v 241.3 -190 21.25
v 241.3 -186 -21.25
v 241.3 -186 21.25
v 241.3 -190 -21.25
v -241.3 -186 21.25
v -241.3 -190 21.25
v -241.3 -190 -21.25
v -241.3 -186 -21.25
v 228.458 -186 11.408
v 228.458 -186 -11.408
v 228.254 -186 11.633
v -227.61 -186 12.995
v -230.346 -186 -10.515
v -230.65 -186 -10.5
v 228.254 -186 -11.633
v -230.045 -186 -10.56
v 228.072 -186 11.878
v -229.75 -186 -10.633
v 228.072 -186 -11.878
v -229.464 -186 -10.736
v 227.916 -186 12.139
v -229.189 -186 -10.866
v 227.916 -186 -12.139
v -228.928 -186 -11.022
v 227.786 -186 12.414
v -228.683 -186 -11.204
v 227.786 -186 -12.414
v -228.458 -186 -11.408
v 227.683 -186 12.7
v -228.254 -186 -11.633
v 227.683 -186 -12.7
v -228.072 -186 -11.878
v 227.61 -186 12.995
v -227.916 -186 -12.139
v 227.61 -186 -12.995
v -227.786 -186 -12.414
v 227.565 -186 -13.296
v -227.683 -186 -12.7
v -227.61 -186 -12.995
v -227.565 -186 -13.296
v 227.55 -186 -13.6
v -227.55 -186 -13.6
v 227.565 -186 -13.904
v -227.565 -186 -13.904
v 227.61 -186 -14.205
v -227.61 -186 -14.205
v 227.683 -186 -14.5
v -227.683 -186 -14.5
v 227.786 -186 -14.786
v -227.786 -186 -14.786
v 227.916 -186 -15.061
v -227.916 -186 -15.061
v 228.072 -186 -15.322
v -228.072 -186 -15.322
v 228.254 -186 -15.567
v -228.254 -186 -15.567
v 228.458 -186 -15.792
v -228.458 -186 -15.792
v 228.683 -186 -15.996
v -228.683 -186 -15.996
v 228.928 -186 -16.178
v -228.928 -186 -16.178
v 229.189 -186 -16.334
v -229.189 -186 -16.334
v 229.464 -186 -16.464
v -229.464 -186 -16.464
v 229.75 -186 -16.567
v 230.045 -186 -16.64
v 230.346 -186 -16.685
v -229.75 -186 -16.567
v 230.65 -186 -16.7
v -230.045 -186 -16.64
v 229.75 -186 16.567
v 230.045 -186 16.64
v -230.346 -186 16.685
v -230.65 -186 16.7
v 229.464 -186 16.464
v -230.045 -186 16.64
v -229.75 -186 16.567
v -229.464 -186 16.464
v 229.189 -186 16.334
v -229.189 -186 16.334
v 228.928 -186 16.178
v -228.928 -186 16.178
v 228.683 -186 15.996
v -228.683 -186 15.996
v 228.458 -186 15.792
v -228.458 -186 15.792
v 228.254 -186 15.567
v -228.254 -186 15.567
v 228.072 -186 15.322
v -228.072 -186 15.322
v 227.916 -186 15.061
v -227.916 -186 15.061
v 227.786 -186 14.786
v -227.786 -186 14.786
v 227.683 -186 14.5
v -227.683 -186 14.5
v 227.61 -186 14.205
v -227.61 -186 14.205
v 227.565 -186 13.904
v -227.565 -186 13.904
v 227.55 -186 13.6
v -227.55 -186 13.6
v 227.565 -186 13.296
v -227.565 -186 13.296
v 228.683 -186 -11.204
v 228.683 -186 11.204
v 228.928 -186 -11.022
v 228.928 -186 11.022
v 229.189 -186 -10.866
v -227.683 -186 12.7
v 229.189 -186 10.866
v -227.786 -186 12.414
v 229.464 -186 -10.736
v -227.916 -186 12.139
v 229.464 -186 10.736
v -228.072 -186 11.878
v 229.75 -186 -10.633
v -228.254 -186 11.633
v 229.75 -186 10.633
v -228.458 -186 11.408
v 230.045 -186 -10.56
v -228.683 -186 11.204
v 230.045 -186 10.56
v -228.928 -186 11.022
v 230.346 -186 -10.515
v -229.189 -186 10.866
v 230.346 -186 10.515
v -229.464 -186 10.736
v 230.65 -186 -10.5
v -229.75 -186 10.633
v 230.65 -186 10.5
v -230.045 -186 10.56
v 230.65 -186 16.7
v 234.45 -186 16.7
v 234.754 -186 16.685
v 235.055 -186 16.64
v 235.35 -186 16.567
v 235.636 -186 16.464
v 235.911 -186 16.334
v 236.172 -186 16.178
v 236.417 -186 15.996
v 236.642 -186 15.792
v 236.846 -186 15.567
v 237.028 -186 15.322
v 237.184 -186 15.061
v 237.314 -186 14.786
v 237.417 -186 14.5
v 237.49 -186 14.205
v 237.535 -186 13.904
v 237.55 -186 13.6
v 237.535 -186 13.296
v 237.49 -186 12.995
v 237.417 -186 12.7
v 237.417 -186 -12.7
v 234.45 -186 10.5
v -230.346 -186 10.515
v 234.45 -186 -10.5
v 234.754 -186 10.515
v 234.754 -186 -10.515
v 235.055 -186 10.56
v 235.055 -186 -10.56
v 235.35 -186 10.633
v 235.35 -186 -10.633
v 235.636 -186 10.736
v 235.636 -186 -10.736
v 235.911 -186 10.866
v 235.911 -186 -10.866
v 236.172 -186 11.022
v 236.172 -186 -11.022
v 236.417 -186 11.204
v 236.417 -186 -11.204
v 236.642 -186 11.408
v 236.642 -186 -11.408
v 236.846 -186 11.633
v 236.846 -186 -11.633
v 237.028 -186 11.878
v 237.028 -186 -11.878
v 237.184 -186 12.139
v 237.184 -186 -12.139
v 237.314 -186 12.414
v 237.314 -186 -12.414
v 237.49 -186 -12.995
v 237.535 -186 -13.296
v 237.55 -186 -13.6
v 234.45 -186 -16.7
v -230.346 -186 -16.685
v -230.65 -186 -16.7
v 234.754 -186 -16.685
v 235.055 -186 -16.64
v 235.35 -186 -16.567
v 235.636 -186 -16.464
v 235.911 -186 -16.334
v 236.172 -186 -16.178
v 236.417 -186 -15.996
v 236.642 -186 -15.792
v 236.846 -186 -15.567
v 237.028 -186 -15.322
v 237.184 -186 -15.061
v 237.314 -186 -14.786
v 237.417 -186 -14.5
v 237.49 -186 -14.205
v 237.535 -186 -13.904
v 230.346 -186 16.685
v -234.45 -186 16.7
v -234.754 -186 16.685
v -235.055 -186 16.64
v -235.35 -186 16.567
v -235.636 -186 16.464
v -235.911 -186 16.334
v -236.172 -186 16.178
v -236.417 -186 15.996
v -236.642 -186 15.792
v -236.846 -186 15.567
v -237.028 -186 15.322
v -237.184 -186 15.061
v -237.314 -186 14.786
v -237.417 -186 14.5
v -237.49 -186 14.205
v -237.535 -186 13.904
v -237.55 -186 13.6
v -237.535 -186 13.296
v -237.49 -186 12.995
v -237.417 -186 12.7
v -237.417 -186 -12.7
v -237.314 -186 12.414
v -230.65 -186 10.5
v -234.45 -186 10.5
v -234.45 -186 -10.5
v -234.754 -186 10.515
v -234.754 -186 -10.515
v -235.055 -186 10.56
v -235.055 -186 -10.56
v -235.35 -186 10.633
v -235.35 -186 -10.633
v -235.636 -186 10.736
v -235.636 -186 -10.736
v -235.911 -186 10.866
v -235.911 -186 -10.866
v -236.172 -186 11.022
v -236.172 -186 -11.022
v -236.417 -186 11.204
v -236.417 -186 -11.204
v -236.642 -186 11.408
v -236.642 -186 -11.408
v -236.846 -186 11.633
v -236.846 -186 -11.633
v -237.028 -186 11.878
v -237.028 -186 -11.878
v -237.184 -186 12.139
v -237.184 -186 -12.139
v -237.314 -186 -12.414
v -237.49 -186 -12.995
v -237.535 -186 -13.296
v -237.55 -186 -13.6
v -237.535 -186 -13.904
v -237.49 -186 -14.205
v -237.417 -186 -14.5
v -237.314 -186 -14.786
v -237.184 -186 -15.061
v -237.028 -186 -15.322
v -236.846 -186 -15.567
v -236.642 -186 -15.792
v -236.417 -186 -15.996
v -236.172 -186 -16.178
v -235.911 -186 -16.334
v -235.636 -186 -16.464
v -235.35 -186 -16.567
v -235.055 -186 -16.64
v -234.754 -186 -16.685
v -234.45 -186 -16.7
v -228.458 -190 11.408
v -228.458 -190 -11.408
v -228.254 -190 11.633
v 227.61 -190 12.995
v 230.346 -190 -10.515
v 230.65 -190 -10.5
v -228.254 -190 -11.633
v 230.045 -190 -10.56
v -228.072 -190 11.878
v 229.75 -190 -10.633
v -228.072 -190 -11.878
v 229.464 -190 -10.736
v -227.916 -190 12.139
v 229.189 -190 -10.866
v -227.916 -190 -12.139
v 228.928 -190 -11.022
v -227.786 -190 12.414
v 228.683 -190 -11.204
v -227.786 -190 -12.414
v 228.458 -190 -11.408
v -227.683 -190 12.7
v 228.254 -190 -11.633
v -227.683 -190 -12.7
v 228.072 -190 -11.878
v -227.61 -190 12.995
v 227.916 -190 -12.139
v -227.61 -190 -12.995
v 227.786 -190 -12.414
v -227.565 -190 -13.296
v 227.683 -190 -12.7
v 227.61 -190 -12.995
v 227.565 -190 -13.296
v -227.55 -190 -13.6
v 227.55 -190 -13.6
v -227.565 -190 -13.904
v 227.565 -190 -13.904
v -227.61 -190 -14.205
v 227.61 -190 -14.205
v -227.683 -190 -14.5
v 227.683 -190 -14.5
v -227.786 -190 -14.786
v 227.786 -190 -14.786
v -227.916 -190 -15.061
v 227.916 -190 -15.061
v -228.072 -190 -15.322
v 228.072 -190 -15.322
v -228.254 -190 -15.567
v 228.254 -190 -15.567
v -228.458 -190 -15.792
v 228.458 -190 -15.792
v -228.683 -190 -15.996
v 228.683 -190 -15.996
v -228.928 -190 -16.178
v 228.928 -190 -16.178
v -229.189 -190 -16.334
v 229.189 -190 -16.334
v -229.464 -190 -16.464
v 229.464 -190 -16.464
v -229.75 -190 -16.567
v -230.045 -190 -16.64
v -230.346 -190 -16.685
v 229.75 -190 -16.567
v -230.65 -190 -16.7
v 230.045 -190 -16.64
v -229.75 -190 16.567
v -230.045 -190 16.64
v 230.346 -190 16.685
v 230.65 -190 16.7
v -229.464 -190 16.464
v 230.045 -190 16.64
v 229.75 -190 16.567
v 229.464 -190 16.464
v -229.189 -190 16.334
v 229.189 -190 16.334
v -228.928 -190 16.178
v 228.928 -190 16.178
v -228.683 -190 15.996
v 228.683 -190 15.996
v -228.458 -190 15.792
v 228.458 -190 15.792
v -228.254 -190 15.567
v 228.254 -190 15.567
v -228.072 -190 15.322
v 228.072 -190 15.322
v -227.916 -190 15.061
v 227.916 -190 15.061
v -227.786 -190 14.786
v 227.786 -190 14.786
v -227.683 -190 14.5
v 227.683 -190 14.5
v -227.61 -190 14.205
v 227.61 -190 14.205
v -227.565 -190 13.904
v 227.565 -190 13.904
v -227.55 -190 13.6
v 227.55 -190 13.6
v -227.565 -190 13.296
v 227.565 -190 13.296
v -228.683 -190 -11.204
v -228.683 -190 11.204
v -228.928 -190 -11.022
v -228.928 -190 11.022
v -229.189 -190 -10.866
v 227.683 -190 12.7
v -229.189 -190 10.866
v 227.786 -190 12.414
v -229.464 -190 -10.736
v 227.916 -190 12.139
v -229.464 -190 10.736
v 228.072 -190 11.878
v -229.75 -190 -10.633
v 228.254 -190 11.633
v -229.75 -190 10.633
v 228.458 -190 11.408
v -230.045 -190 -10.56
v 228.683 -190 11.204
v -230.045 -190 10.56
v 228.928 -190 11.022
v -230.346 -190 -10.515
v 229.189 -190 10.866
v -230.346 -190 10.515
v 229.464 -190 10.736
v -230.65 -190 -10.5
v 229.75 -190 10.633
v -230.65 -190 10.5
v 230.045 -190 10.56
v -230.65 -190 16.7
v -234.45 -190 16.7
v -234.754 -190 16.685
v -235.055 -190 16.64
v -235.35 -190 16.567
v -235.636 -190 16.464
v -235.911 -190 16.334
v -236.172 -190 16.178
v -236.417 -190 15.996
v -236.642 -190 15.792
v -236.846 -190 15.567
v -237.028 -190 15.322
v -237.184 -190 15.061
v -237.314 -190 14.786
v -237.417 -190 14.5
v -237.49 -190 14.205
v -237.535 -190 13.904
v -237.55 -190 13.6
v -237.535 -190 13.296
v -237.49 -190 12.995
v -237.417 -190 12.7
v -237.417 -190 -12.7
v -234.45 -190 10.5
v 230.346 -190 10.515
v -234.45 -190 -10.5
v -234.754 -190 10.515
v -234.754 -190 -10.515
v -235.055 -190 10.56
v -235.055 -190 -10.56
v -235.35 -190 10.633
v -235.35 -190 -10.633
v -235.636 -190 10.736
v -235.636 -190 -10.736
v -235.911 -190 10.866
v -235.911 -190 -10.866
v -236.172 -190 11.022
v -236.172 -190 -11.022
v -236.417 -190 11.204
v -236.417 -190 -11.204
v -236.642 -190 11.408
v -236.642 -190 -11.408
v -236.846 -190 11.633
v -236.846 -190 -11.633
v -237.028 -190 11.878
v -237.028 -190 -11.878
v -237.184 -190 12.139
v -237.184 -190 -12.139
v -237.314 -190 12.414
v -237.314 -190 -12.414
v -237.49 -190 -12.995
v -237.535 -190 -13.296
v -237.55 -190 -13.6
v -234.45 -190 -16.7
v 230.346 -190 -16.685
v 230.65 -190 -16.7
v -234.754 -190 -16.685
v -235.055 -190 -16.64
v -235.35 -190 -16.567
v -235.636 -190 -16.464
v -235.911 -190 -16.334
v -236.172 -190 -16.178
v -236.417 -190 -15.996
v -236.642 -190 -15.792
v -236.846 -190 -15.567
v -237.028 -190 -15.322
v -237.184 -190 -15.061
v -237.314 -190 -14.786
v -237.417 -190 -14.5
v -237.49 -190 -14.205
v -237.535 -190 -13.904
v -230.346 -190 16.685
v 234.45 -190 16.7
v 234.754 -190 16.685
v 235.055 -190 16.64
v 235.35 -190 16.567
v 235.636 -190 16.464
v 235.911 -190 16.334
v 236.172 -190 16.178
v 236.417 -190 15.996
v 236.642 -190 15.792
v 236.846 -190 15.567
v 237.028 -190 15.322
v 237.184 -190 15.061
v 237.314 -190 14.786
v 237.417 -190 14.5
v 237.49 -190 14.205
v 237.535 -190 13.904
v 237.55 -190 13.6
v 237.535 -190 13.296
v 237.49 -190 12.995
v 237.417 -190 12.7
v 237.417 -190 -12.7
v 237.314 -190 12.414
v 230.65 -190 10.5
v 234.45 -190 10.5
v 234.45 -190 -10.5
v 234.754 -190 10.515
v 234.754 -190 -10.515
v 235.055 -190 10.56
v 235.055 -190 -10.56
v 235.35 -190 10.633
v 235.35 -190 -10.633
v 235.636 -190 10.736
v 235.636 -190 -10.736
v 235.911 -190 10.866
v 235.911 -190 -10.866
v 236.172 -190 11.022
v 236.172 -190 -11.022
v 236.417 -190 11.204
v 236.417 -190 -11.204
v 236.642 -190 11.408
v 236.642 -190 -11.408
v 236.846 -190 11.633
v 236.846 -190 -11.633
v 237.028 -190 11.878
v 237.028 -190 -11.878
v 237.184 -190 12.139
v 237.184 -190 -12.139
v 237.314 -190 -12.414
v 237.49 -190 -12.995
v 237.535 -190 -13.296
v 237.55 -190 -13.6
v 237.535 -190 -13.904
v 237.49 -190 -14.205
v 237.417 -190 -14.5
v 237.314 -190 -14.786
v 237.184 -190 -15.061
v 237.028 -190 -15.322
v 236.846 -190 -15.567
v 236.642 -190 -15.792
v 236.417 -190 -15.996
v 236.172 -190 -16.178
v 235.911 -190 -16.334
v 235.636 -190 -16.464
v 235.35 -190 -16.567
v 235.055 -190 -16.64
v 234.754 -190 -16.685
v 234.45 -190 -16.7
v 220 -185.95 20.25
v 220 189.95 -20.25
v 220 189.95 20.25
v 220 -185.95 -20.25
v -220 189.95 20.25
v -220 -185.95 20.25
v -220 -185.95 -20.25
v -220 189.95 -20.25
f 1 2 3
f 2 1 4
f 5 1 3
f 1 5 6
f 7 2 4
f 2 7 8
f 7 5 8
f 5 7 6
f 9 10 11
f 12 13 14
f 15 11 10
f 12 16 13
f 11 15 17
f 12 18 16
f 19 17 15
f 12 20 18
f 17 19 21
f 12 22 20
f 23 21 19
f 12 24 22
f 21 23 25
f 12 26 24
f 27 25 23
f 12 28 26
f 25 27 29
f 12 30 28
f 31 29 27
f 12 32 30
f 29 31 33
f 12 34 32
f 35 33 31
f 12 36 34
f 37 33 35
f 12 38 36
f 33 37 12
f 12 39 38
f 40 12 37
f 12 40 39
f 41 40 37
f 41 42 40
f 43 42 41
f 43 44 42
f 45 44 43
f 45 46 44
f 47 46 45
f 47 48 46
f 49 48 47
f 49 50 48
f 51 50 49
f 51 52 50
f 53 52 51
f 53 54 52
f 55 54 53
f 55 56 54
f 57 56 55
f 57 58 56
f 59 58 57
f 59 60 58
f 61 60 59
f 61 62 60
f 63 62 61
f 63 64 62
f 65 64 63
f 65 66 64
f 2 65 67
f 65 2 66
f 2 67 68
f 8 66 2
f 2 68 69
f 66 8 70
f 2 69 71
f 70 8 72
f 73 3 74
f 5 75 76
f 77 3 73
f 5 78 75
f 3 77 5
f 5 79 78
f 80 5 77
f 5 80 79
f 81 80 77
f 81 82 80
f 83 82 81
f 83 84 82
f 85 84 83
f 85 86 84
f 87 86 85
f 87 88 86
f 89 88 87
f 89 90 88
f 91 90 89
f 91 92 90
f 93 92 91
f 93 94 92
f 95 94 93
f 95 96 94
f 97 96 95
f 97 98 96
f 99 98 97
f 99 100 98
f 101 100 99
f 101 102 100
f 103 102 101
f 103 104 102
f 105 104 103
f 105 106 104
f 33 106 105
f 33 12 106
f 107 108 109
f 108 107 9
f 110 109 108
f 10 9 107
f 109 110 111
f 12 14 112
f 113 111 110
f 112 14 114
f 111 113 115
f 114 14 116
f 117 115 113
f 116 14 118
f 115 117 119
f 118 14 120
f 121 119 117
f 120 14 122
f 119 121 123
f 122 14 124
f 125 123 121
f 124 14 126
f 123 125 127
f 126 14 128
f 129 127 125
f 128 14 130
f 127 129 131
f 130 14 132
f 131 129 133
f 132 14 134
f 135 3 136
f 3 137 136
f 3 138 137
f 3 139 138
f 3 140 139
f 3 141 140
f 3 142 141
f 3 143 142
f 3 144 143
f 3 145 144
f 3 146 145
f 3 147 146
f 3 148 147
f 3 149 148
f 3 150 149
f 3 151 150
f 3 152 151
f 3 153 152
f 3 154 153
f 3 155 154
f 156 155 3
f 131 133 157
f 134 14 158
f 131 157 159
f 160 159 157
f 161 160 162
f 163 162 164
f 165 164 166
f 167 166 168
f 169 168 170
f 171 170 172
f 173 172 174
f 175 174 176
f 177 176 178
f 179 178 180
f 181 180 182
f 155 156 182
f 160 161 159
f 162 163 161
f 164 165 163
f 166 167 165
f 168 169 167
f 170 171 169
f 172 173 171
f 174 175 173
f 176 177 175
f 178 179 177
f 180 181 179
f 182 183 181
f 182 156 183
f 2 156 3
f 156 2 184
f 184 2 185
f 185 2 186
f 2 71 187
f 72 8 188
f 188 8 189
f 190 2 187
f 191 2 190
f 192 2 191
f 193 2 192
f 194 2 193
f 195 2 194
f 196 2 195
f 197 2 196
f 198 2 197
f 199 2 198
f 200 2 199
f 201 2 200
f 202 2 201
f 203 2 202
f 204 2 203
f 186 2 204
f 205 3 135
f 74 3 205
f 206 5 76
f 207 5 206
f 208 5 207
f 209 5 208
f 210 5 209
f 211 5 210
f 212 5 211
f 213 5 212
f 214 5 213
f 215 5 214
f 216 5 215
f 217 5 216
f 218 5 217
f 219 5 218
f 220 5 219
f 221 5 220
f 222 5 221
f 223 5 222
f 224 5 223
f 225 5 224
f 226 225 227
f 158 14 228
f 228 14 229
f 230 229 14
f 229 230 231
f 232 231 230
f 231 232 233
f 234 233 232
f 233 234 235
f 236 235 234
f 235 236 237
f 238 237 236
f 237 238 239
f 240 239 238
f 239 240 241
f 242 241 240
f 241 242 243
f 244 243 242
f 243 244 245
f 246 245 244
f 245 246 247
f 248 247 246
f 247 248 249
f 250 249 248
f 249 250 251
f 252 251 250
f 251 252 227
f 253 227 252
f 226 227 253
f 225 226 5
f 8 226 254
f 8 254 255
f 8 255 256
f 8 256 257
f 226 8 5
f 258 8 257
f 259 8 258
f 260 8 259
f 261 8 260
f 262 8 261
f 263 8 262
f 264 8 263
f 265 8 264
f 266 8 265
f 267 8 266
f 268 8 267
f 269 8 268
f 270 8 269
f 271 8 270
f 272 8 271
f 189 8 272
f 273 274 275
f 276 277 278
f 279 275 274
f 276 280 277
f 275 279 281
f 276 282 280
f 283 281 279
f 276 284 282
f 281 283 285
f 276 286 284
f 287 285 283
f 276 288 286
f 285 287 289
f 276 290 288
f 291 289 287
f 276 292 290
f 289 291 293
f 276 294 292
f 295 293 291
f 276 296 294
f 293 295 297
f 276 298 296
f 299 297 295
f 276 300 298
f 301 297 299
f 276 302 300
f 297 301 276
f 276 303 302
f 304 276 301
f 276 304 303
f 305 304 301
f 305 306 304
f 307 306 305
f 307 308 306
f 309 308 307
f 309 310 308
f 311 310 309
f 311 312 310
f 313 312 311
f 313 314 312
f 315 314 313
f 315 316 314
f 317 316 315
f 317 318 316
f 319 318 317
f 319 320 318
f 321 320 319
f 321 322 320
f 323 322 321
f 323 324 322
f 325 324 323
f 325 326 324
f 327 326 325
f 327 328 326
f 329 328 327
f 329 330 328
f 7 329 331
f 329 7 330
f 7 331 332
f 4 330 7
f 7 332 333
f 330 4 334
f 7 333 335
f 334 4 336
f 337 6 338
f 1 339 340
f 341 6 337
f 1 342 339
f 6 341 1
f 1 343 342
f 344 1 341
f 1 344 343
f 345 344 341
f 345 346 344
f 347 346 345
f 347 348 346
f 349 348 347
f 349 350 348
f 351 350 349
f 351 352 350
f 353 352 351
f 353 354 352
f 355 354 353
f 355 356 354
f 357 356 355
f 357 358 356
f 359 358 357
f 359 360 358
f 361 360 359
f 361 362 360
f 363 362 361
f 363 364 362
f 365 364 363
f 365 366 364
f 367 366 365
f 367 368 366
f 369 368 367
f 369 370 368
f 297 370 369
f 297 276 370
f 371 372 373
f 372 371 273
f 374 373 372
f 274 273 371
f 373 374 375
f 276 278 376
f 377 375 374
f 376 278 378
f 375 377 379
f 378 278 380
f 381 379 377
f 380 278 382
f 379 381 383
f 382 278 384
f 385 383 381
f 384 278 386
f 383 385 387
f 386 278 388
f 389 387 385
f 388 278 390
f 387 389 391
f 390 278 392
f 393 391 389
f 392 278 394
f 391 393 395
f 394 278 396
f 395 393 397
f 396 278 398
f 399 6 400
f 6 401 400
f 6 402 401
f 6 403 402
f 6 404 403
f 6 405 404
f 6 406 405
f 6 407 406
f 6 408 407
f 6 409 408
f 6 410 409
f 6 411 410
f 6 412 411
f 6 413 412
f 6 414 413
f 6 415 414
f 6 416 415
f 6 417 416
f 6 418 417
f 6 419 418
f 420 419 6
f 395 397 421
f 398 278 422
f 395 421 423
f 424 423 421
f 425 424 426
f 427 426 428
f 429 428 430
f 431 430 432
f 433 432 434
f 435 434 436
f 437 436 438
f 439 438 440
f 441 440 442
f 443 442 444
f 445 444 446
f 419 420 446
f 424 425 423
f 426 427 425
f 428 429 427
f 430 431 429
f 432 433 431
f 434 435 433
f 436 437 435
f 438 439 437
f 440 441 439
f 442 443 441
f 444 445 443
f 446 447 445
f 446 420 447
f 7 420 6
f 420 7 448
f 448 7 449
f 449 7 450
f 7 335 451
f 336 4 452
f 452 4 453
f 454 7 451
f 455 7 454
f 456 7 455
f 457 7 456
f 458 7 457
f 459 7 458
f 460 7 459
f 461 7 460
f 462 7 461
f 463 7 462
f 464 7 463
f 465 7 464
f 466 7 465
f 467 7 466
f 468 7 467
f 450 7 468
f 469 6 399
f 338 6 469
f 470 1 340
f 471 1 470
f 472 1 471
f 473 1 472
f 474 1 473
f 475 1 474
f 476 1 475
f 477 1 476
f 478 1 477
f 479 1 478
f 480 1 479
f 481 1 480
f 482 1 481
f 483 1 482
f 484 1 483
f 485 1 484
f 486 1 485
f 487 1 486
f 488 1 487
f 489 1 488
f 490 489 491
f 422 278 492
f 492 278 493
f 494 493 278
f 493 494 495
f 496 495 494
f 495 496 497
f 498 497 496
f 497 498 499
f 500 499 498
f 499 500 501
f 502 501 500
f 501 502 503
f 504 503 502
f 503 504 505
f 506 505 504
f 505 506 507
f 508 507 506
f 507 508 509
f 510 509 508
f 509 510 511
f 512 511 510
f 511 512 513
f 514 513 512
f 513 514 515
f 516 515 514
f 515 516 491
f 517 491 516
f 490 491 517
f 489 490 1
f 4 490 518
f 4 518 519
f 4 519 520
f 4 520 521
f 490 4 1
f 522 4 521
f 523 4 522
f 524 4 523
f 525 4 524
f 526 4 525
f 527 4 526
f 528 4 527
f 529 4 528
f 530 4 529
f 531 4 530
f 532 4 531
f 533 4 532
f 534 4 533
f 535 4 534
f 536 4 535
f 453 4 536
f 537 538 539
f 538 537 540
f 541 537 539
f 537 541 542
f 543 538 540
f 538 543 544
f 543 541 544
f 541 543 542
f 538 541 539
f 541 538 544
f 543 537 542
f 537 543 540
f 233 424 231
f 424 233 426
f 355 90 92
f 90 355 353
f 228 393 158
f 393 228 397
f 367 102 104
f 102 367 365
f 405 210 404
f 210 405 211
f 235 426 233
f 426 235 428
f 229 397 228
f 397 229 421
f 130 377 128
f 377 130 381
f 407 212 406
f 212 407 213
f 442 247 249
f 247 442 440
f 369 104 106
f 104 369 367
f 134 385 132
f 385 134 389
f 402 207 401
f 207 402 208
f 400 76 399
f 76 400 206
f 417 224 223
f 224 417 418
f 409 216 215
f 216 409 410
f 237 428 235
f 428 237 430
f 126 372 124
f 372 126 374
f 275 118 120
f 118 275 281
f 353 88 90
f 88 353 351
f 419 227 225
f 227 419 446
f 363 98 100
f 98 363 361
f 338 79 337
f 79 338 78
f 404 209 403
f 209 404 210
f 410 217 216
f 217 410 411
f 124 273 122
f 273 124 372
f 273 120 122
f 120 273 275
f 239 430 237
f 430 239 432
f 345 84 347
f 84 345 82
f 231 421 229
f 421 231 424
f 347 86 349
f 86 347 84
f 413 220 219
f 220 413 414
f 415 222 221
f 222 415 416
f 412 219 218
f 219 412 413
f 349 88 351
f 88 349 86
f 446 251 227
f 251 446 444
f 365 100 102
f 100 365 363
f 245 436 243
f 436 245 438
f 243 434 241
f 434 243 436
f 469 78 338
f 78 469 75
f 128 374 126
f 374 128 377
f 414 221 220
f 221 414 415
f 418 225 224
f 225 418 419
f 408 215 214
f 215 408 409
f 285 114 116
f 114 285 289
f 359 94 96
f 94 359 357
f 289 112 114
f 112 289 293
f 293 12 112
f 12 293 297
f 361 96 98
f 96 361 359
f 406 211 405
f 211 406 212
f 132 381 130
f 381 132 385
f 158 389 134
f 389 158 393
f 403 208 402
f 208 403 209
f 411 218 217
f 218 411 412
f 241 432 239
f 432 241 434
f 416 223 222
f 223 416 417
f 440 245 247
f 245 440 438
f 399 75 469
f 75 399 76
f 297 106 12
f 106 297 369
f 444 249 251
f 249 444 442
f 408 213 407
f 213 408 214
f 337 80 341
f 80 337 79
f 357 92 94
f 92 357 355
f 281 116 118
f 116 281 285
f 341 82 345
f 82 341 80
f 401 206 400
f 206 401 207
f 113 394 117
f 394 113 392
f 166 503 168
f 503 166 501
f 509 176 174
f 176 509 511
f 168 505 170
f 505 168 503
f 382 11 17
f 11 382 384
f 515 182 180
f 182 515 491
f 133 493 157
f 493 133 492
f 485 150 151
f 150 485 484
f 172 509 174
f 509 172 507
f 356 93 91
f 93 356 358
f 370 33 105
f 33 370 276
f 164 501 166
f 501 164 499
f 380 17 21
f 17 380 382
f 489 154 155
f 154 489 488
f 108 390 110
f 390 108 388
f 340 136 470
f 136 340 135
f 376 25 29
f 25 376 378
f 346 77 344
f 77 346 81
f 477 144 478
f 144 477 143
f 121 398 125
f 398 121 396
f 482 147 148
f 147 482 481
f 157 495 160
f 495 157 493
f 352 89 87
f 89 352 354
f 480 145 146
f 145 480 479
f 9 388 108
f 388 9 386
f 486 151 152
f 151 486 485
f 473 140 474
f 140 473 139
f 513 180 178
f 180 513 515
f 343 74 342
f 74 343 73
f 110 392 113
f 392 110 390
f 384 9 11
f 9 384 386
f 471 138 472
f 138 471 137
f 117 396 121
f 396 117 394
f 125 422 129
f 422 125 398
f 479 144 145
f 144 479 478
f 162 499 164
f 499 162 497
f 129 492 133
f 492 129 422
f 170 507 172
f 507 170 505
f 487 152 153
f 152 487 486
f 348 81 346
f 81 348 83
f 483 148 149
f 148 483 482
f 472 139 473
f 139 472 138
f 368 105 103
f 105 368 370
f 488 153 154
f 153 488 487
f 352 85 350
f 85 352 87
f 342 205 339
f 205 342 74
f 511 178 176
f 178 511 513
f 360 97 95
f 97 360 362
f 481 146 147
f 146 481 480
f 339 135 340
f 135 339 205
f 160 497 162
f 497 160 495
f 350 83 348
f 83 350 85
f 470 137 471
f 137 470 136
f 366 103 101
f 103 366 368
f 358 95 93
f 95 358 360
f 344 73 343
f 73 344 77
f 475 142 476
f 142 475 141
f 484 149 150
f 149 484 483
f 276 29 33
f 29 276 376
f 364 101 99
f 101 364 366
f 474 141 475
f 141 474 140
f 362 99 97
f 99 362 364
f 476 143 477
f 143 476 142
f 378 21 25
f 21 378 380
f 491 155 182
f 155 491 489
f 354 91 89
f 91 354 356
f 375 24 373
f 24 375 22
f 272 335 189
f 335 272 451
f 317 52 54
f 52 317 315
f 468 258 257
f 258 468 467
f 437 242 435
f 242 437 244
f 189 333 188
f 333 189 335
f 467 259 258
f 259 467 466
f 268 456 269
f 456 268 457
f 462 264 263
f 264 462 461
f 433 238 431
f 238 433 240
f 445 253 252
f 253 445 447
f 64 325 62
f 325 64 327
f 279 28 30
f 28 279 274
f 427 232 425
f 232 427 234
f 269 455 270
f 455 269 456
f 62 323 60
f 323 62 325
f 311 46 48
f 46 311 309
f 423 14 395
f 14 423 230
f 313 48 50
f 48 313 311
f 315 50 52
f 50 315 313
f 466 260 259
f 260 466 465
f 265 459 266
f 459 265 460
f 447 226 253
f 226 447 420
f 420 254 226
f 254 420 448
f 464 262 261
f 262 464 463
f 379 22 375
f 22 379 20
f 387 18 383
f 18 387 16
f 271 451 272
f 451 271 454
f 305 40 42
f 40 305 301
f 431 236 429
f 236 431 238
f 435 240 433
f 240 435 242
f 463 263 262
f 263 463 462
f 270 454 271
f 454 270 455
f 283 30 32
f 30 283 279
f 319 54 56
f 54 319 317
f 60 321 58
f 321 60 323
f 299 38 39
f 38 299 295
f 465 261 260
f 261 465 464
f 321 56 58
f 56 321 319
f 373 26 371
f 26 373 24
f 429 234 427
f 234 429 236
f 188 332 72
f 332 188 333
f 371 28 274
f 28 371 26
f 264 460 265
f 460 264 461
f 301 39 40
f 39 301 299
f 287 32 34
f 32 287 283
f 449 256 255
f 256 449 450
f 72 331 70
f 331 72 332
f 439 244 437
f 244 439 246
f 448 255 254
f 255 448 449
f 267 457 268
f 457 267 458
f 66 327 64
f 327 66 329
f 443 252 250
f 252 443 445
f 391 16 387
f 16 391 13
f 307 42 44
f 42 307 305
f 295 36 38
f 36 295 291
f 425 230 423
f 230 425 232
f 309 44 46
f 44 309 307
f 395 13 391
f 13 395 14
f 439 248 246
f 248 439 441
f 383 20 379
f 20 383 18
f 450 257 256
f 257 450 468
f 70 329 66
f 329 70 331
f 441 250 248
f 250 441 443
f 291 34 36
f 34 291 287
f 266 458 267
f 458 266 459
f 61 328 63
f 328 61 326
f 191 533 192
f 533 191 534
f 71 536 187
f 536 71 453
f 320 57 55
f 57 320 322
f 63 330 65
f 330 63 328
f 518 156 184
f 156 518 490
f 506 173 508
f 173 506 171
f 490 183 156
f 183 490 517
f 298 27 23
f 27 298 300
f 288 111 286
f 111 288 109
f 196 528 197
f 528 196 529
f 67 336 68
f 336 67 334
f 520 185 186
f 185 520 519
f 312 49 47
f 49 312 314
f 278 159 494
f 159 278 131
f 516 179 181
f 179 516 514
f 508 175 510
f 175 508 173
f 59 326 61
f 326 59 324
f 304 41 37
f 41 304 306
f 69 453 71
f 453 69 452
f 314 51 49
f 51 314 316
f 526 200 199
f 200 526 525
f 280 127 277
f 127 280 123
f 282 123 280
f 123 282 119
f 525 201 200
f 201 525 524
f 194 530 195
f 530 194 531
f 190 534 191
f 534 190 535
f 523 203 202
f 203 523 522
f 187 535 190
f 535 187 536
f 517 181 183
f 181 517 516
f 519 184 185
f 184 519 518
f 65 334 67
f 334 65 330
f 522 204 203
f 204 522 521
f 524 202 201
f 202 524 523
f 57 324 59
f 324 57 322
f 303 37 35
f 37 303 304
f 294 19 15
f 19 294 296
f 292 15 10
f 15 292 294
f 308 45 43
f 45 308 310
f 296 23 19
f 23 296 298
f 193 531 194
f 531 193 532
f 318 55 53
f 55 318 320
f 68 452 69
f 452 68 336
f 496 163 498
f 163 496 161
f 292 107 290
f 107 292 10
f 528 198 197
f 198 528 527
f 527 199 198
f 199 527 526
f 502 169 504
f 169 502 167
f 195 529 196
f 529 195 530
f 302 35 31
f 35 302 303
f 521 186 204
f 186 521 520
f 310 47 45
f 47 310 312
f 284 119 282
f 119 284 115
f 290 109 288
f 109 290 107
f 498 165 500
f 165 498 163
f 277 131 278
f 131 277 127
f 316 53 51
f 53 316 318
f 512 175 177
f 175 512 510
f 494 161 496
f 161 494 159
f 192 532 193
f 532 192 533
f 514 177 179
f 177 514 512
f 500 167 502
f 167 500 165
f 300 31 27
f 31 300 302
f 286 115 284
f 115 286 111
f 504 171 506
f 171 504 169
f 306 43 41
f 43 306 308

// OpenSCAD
// ============================================================================
// Atom Lithography Machine — Parametric OpenSCAD Module (S9.HPC-02)
// ============================================================================
// part_id           : S9.HPC-02
// parent_bom_id     : S9.HPC
// subsystem         : S9
// part_name         : 1U Ultra-Dusuk-Gecikmeli Cut-Through 100 GbE RoCEv2 Optik Kopru + 4x QSFP28-100G-SR4 + 20m OM4 MPO-12 (Exp143, 4.20 kg)
// material          : Al 6061
// temp_stage        : 300 K (HPC rafi)
// vacuum_grade      : Atmosfer
// tolerance         : tau_ingest <= 0.80 us
// computed_mass_kg  : 4.20000
// envelope_mm       : 482.600 x 420.400 x 42.500
// design_maturity   : M0_M1_DETAILED_CAD_DESIGN_ONLY
// no_lab_measurement: true
// iec61508_certified: false
// semi_s2_certified : false
// Units: millimeters (mm)
// ============================================================================

$fn = 64;

// Nominal bounding envelope parameters (mm)
bbox_x = 482.6000;
bbox_y = 420.4000;
bbox_z = 42.5000;

// Part-specific parametric dimensions
u_count = 1;
depth_mm = 380.0;
qsfp28_ports = 4;
ingest_us = 0.777;

// Interface / port parameters (mm)

module part_S9_HPC_02() {
  difference() {
    union() {
      // 19-inch EIA-310 front faceplate
      translate([0.000, -188.000, 0.000]) cube([482.600, 4.000, 42.500], center=true);
      // Main rack chassis enclosure
      translate([0.000, 2.000, 0.000]) cube([440.000, 375.900, 40.500], center=true);
    }
    // EIA-310 rack ear mounting slot (top-left)
    translate([-232.550, -188.000, 13.600]) rotate([90.000, 0.000, 0.000]) {
      hull() {
        translate([-1.900, 0, 0]) cylinder(d=6.200, h=8.000, center=true);
        translate([1.900, 0, 0]) cylinder(d=6.200, h=8.000, center=true);
      }
    }
    // EIA-310 rack ear mounting slot (top-right)
    translate([232.550, -188.000, 13.600]) rotate([90.000, 0.000, 0.000]) {
      hull() {
        translate([-1.900, 0, 0]) cylinder(d=6.200, h=8.000, center=true);
        translate([1.900, 0, 0]) cylinder(d=6.200, h=8.000, center=true);
      }
    }
    // EIA-310 rack ear mounting slot (bottom-left)
    translate([-232.550, -188.000, -13.600]) rotate([90.000, 0.000, 0.000]) {
      hull() {
        translate([-1.900, 0, 0]) cylinder(d=6.200, h=8.000, center=true);
        translate([1.900, 0, 0]) cylinder(d=6.200, h=8.000, center=true);
      }
    }
    // EIA-310 rack ear mounting slot (bottom-right)
    translate([232.550, -188.000, -13.600]) rotate([90.000, 0.000, 0.000]) {
      hull() {
        translate([-1.900, 0, 0]) cylinder(d=6.200, h=8.000, center=true);
        translate([1.900, 0, 0]) cylinder(d=6.200, h=8.000, center=true);
      }
    }
  }
}

// World assembly mounting transform (global machine frame, mm / deg):
// translate([2750.000, -900.000, 290.000]) rotate([0.000, 0.000, 0.000]) part_S9_HPC_02();

part_S9_HPC_02();
